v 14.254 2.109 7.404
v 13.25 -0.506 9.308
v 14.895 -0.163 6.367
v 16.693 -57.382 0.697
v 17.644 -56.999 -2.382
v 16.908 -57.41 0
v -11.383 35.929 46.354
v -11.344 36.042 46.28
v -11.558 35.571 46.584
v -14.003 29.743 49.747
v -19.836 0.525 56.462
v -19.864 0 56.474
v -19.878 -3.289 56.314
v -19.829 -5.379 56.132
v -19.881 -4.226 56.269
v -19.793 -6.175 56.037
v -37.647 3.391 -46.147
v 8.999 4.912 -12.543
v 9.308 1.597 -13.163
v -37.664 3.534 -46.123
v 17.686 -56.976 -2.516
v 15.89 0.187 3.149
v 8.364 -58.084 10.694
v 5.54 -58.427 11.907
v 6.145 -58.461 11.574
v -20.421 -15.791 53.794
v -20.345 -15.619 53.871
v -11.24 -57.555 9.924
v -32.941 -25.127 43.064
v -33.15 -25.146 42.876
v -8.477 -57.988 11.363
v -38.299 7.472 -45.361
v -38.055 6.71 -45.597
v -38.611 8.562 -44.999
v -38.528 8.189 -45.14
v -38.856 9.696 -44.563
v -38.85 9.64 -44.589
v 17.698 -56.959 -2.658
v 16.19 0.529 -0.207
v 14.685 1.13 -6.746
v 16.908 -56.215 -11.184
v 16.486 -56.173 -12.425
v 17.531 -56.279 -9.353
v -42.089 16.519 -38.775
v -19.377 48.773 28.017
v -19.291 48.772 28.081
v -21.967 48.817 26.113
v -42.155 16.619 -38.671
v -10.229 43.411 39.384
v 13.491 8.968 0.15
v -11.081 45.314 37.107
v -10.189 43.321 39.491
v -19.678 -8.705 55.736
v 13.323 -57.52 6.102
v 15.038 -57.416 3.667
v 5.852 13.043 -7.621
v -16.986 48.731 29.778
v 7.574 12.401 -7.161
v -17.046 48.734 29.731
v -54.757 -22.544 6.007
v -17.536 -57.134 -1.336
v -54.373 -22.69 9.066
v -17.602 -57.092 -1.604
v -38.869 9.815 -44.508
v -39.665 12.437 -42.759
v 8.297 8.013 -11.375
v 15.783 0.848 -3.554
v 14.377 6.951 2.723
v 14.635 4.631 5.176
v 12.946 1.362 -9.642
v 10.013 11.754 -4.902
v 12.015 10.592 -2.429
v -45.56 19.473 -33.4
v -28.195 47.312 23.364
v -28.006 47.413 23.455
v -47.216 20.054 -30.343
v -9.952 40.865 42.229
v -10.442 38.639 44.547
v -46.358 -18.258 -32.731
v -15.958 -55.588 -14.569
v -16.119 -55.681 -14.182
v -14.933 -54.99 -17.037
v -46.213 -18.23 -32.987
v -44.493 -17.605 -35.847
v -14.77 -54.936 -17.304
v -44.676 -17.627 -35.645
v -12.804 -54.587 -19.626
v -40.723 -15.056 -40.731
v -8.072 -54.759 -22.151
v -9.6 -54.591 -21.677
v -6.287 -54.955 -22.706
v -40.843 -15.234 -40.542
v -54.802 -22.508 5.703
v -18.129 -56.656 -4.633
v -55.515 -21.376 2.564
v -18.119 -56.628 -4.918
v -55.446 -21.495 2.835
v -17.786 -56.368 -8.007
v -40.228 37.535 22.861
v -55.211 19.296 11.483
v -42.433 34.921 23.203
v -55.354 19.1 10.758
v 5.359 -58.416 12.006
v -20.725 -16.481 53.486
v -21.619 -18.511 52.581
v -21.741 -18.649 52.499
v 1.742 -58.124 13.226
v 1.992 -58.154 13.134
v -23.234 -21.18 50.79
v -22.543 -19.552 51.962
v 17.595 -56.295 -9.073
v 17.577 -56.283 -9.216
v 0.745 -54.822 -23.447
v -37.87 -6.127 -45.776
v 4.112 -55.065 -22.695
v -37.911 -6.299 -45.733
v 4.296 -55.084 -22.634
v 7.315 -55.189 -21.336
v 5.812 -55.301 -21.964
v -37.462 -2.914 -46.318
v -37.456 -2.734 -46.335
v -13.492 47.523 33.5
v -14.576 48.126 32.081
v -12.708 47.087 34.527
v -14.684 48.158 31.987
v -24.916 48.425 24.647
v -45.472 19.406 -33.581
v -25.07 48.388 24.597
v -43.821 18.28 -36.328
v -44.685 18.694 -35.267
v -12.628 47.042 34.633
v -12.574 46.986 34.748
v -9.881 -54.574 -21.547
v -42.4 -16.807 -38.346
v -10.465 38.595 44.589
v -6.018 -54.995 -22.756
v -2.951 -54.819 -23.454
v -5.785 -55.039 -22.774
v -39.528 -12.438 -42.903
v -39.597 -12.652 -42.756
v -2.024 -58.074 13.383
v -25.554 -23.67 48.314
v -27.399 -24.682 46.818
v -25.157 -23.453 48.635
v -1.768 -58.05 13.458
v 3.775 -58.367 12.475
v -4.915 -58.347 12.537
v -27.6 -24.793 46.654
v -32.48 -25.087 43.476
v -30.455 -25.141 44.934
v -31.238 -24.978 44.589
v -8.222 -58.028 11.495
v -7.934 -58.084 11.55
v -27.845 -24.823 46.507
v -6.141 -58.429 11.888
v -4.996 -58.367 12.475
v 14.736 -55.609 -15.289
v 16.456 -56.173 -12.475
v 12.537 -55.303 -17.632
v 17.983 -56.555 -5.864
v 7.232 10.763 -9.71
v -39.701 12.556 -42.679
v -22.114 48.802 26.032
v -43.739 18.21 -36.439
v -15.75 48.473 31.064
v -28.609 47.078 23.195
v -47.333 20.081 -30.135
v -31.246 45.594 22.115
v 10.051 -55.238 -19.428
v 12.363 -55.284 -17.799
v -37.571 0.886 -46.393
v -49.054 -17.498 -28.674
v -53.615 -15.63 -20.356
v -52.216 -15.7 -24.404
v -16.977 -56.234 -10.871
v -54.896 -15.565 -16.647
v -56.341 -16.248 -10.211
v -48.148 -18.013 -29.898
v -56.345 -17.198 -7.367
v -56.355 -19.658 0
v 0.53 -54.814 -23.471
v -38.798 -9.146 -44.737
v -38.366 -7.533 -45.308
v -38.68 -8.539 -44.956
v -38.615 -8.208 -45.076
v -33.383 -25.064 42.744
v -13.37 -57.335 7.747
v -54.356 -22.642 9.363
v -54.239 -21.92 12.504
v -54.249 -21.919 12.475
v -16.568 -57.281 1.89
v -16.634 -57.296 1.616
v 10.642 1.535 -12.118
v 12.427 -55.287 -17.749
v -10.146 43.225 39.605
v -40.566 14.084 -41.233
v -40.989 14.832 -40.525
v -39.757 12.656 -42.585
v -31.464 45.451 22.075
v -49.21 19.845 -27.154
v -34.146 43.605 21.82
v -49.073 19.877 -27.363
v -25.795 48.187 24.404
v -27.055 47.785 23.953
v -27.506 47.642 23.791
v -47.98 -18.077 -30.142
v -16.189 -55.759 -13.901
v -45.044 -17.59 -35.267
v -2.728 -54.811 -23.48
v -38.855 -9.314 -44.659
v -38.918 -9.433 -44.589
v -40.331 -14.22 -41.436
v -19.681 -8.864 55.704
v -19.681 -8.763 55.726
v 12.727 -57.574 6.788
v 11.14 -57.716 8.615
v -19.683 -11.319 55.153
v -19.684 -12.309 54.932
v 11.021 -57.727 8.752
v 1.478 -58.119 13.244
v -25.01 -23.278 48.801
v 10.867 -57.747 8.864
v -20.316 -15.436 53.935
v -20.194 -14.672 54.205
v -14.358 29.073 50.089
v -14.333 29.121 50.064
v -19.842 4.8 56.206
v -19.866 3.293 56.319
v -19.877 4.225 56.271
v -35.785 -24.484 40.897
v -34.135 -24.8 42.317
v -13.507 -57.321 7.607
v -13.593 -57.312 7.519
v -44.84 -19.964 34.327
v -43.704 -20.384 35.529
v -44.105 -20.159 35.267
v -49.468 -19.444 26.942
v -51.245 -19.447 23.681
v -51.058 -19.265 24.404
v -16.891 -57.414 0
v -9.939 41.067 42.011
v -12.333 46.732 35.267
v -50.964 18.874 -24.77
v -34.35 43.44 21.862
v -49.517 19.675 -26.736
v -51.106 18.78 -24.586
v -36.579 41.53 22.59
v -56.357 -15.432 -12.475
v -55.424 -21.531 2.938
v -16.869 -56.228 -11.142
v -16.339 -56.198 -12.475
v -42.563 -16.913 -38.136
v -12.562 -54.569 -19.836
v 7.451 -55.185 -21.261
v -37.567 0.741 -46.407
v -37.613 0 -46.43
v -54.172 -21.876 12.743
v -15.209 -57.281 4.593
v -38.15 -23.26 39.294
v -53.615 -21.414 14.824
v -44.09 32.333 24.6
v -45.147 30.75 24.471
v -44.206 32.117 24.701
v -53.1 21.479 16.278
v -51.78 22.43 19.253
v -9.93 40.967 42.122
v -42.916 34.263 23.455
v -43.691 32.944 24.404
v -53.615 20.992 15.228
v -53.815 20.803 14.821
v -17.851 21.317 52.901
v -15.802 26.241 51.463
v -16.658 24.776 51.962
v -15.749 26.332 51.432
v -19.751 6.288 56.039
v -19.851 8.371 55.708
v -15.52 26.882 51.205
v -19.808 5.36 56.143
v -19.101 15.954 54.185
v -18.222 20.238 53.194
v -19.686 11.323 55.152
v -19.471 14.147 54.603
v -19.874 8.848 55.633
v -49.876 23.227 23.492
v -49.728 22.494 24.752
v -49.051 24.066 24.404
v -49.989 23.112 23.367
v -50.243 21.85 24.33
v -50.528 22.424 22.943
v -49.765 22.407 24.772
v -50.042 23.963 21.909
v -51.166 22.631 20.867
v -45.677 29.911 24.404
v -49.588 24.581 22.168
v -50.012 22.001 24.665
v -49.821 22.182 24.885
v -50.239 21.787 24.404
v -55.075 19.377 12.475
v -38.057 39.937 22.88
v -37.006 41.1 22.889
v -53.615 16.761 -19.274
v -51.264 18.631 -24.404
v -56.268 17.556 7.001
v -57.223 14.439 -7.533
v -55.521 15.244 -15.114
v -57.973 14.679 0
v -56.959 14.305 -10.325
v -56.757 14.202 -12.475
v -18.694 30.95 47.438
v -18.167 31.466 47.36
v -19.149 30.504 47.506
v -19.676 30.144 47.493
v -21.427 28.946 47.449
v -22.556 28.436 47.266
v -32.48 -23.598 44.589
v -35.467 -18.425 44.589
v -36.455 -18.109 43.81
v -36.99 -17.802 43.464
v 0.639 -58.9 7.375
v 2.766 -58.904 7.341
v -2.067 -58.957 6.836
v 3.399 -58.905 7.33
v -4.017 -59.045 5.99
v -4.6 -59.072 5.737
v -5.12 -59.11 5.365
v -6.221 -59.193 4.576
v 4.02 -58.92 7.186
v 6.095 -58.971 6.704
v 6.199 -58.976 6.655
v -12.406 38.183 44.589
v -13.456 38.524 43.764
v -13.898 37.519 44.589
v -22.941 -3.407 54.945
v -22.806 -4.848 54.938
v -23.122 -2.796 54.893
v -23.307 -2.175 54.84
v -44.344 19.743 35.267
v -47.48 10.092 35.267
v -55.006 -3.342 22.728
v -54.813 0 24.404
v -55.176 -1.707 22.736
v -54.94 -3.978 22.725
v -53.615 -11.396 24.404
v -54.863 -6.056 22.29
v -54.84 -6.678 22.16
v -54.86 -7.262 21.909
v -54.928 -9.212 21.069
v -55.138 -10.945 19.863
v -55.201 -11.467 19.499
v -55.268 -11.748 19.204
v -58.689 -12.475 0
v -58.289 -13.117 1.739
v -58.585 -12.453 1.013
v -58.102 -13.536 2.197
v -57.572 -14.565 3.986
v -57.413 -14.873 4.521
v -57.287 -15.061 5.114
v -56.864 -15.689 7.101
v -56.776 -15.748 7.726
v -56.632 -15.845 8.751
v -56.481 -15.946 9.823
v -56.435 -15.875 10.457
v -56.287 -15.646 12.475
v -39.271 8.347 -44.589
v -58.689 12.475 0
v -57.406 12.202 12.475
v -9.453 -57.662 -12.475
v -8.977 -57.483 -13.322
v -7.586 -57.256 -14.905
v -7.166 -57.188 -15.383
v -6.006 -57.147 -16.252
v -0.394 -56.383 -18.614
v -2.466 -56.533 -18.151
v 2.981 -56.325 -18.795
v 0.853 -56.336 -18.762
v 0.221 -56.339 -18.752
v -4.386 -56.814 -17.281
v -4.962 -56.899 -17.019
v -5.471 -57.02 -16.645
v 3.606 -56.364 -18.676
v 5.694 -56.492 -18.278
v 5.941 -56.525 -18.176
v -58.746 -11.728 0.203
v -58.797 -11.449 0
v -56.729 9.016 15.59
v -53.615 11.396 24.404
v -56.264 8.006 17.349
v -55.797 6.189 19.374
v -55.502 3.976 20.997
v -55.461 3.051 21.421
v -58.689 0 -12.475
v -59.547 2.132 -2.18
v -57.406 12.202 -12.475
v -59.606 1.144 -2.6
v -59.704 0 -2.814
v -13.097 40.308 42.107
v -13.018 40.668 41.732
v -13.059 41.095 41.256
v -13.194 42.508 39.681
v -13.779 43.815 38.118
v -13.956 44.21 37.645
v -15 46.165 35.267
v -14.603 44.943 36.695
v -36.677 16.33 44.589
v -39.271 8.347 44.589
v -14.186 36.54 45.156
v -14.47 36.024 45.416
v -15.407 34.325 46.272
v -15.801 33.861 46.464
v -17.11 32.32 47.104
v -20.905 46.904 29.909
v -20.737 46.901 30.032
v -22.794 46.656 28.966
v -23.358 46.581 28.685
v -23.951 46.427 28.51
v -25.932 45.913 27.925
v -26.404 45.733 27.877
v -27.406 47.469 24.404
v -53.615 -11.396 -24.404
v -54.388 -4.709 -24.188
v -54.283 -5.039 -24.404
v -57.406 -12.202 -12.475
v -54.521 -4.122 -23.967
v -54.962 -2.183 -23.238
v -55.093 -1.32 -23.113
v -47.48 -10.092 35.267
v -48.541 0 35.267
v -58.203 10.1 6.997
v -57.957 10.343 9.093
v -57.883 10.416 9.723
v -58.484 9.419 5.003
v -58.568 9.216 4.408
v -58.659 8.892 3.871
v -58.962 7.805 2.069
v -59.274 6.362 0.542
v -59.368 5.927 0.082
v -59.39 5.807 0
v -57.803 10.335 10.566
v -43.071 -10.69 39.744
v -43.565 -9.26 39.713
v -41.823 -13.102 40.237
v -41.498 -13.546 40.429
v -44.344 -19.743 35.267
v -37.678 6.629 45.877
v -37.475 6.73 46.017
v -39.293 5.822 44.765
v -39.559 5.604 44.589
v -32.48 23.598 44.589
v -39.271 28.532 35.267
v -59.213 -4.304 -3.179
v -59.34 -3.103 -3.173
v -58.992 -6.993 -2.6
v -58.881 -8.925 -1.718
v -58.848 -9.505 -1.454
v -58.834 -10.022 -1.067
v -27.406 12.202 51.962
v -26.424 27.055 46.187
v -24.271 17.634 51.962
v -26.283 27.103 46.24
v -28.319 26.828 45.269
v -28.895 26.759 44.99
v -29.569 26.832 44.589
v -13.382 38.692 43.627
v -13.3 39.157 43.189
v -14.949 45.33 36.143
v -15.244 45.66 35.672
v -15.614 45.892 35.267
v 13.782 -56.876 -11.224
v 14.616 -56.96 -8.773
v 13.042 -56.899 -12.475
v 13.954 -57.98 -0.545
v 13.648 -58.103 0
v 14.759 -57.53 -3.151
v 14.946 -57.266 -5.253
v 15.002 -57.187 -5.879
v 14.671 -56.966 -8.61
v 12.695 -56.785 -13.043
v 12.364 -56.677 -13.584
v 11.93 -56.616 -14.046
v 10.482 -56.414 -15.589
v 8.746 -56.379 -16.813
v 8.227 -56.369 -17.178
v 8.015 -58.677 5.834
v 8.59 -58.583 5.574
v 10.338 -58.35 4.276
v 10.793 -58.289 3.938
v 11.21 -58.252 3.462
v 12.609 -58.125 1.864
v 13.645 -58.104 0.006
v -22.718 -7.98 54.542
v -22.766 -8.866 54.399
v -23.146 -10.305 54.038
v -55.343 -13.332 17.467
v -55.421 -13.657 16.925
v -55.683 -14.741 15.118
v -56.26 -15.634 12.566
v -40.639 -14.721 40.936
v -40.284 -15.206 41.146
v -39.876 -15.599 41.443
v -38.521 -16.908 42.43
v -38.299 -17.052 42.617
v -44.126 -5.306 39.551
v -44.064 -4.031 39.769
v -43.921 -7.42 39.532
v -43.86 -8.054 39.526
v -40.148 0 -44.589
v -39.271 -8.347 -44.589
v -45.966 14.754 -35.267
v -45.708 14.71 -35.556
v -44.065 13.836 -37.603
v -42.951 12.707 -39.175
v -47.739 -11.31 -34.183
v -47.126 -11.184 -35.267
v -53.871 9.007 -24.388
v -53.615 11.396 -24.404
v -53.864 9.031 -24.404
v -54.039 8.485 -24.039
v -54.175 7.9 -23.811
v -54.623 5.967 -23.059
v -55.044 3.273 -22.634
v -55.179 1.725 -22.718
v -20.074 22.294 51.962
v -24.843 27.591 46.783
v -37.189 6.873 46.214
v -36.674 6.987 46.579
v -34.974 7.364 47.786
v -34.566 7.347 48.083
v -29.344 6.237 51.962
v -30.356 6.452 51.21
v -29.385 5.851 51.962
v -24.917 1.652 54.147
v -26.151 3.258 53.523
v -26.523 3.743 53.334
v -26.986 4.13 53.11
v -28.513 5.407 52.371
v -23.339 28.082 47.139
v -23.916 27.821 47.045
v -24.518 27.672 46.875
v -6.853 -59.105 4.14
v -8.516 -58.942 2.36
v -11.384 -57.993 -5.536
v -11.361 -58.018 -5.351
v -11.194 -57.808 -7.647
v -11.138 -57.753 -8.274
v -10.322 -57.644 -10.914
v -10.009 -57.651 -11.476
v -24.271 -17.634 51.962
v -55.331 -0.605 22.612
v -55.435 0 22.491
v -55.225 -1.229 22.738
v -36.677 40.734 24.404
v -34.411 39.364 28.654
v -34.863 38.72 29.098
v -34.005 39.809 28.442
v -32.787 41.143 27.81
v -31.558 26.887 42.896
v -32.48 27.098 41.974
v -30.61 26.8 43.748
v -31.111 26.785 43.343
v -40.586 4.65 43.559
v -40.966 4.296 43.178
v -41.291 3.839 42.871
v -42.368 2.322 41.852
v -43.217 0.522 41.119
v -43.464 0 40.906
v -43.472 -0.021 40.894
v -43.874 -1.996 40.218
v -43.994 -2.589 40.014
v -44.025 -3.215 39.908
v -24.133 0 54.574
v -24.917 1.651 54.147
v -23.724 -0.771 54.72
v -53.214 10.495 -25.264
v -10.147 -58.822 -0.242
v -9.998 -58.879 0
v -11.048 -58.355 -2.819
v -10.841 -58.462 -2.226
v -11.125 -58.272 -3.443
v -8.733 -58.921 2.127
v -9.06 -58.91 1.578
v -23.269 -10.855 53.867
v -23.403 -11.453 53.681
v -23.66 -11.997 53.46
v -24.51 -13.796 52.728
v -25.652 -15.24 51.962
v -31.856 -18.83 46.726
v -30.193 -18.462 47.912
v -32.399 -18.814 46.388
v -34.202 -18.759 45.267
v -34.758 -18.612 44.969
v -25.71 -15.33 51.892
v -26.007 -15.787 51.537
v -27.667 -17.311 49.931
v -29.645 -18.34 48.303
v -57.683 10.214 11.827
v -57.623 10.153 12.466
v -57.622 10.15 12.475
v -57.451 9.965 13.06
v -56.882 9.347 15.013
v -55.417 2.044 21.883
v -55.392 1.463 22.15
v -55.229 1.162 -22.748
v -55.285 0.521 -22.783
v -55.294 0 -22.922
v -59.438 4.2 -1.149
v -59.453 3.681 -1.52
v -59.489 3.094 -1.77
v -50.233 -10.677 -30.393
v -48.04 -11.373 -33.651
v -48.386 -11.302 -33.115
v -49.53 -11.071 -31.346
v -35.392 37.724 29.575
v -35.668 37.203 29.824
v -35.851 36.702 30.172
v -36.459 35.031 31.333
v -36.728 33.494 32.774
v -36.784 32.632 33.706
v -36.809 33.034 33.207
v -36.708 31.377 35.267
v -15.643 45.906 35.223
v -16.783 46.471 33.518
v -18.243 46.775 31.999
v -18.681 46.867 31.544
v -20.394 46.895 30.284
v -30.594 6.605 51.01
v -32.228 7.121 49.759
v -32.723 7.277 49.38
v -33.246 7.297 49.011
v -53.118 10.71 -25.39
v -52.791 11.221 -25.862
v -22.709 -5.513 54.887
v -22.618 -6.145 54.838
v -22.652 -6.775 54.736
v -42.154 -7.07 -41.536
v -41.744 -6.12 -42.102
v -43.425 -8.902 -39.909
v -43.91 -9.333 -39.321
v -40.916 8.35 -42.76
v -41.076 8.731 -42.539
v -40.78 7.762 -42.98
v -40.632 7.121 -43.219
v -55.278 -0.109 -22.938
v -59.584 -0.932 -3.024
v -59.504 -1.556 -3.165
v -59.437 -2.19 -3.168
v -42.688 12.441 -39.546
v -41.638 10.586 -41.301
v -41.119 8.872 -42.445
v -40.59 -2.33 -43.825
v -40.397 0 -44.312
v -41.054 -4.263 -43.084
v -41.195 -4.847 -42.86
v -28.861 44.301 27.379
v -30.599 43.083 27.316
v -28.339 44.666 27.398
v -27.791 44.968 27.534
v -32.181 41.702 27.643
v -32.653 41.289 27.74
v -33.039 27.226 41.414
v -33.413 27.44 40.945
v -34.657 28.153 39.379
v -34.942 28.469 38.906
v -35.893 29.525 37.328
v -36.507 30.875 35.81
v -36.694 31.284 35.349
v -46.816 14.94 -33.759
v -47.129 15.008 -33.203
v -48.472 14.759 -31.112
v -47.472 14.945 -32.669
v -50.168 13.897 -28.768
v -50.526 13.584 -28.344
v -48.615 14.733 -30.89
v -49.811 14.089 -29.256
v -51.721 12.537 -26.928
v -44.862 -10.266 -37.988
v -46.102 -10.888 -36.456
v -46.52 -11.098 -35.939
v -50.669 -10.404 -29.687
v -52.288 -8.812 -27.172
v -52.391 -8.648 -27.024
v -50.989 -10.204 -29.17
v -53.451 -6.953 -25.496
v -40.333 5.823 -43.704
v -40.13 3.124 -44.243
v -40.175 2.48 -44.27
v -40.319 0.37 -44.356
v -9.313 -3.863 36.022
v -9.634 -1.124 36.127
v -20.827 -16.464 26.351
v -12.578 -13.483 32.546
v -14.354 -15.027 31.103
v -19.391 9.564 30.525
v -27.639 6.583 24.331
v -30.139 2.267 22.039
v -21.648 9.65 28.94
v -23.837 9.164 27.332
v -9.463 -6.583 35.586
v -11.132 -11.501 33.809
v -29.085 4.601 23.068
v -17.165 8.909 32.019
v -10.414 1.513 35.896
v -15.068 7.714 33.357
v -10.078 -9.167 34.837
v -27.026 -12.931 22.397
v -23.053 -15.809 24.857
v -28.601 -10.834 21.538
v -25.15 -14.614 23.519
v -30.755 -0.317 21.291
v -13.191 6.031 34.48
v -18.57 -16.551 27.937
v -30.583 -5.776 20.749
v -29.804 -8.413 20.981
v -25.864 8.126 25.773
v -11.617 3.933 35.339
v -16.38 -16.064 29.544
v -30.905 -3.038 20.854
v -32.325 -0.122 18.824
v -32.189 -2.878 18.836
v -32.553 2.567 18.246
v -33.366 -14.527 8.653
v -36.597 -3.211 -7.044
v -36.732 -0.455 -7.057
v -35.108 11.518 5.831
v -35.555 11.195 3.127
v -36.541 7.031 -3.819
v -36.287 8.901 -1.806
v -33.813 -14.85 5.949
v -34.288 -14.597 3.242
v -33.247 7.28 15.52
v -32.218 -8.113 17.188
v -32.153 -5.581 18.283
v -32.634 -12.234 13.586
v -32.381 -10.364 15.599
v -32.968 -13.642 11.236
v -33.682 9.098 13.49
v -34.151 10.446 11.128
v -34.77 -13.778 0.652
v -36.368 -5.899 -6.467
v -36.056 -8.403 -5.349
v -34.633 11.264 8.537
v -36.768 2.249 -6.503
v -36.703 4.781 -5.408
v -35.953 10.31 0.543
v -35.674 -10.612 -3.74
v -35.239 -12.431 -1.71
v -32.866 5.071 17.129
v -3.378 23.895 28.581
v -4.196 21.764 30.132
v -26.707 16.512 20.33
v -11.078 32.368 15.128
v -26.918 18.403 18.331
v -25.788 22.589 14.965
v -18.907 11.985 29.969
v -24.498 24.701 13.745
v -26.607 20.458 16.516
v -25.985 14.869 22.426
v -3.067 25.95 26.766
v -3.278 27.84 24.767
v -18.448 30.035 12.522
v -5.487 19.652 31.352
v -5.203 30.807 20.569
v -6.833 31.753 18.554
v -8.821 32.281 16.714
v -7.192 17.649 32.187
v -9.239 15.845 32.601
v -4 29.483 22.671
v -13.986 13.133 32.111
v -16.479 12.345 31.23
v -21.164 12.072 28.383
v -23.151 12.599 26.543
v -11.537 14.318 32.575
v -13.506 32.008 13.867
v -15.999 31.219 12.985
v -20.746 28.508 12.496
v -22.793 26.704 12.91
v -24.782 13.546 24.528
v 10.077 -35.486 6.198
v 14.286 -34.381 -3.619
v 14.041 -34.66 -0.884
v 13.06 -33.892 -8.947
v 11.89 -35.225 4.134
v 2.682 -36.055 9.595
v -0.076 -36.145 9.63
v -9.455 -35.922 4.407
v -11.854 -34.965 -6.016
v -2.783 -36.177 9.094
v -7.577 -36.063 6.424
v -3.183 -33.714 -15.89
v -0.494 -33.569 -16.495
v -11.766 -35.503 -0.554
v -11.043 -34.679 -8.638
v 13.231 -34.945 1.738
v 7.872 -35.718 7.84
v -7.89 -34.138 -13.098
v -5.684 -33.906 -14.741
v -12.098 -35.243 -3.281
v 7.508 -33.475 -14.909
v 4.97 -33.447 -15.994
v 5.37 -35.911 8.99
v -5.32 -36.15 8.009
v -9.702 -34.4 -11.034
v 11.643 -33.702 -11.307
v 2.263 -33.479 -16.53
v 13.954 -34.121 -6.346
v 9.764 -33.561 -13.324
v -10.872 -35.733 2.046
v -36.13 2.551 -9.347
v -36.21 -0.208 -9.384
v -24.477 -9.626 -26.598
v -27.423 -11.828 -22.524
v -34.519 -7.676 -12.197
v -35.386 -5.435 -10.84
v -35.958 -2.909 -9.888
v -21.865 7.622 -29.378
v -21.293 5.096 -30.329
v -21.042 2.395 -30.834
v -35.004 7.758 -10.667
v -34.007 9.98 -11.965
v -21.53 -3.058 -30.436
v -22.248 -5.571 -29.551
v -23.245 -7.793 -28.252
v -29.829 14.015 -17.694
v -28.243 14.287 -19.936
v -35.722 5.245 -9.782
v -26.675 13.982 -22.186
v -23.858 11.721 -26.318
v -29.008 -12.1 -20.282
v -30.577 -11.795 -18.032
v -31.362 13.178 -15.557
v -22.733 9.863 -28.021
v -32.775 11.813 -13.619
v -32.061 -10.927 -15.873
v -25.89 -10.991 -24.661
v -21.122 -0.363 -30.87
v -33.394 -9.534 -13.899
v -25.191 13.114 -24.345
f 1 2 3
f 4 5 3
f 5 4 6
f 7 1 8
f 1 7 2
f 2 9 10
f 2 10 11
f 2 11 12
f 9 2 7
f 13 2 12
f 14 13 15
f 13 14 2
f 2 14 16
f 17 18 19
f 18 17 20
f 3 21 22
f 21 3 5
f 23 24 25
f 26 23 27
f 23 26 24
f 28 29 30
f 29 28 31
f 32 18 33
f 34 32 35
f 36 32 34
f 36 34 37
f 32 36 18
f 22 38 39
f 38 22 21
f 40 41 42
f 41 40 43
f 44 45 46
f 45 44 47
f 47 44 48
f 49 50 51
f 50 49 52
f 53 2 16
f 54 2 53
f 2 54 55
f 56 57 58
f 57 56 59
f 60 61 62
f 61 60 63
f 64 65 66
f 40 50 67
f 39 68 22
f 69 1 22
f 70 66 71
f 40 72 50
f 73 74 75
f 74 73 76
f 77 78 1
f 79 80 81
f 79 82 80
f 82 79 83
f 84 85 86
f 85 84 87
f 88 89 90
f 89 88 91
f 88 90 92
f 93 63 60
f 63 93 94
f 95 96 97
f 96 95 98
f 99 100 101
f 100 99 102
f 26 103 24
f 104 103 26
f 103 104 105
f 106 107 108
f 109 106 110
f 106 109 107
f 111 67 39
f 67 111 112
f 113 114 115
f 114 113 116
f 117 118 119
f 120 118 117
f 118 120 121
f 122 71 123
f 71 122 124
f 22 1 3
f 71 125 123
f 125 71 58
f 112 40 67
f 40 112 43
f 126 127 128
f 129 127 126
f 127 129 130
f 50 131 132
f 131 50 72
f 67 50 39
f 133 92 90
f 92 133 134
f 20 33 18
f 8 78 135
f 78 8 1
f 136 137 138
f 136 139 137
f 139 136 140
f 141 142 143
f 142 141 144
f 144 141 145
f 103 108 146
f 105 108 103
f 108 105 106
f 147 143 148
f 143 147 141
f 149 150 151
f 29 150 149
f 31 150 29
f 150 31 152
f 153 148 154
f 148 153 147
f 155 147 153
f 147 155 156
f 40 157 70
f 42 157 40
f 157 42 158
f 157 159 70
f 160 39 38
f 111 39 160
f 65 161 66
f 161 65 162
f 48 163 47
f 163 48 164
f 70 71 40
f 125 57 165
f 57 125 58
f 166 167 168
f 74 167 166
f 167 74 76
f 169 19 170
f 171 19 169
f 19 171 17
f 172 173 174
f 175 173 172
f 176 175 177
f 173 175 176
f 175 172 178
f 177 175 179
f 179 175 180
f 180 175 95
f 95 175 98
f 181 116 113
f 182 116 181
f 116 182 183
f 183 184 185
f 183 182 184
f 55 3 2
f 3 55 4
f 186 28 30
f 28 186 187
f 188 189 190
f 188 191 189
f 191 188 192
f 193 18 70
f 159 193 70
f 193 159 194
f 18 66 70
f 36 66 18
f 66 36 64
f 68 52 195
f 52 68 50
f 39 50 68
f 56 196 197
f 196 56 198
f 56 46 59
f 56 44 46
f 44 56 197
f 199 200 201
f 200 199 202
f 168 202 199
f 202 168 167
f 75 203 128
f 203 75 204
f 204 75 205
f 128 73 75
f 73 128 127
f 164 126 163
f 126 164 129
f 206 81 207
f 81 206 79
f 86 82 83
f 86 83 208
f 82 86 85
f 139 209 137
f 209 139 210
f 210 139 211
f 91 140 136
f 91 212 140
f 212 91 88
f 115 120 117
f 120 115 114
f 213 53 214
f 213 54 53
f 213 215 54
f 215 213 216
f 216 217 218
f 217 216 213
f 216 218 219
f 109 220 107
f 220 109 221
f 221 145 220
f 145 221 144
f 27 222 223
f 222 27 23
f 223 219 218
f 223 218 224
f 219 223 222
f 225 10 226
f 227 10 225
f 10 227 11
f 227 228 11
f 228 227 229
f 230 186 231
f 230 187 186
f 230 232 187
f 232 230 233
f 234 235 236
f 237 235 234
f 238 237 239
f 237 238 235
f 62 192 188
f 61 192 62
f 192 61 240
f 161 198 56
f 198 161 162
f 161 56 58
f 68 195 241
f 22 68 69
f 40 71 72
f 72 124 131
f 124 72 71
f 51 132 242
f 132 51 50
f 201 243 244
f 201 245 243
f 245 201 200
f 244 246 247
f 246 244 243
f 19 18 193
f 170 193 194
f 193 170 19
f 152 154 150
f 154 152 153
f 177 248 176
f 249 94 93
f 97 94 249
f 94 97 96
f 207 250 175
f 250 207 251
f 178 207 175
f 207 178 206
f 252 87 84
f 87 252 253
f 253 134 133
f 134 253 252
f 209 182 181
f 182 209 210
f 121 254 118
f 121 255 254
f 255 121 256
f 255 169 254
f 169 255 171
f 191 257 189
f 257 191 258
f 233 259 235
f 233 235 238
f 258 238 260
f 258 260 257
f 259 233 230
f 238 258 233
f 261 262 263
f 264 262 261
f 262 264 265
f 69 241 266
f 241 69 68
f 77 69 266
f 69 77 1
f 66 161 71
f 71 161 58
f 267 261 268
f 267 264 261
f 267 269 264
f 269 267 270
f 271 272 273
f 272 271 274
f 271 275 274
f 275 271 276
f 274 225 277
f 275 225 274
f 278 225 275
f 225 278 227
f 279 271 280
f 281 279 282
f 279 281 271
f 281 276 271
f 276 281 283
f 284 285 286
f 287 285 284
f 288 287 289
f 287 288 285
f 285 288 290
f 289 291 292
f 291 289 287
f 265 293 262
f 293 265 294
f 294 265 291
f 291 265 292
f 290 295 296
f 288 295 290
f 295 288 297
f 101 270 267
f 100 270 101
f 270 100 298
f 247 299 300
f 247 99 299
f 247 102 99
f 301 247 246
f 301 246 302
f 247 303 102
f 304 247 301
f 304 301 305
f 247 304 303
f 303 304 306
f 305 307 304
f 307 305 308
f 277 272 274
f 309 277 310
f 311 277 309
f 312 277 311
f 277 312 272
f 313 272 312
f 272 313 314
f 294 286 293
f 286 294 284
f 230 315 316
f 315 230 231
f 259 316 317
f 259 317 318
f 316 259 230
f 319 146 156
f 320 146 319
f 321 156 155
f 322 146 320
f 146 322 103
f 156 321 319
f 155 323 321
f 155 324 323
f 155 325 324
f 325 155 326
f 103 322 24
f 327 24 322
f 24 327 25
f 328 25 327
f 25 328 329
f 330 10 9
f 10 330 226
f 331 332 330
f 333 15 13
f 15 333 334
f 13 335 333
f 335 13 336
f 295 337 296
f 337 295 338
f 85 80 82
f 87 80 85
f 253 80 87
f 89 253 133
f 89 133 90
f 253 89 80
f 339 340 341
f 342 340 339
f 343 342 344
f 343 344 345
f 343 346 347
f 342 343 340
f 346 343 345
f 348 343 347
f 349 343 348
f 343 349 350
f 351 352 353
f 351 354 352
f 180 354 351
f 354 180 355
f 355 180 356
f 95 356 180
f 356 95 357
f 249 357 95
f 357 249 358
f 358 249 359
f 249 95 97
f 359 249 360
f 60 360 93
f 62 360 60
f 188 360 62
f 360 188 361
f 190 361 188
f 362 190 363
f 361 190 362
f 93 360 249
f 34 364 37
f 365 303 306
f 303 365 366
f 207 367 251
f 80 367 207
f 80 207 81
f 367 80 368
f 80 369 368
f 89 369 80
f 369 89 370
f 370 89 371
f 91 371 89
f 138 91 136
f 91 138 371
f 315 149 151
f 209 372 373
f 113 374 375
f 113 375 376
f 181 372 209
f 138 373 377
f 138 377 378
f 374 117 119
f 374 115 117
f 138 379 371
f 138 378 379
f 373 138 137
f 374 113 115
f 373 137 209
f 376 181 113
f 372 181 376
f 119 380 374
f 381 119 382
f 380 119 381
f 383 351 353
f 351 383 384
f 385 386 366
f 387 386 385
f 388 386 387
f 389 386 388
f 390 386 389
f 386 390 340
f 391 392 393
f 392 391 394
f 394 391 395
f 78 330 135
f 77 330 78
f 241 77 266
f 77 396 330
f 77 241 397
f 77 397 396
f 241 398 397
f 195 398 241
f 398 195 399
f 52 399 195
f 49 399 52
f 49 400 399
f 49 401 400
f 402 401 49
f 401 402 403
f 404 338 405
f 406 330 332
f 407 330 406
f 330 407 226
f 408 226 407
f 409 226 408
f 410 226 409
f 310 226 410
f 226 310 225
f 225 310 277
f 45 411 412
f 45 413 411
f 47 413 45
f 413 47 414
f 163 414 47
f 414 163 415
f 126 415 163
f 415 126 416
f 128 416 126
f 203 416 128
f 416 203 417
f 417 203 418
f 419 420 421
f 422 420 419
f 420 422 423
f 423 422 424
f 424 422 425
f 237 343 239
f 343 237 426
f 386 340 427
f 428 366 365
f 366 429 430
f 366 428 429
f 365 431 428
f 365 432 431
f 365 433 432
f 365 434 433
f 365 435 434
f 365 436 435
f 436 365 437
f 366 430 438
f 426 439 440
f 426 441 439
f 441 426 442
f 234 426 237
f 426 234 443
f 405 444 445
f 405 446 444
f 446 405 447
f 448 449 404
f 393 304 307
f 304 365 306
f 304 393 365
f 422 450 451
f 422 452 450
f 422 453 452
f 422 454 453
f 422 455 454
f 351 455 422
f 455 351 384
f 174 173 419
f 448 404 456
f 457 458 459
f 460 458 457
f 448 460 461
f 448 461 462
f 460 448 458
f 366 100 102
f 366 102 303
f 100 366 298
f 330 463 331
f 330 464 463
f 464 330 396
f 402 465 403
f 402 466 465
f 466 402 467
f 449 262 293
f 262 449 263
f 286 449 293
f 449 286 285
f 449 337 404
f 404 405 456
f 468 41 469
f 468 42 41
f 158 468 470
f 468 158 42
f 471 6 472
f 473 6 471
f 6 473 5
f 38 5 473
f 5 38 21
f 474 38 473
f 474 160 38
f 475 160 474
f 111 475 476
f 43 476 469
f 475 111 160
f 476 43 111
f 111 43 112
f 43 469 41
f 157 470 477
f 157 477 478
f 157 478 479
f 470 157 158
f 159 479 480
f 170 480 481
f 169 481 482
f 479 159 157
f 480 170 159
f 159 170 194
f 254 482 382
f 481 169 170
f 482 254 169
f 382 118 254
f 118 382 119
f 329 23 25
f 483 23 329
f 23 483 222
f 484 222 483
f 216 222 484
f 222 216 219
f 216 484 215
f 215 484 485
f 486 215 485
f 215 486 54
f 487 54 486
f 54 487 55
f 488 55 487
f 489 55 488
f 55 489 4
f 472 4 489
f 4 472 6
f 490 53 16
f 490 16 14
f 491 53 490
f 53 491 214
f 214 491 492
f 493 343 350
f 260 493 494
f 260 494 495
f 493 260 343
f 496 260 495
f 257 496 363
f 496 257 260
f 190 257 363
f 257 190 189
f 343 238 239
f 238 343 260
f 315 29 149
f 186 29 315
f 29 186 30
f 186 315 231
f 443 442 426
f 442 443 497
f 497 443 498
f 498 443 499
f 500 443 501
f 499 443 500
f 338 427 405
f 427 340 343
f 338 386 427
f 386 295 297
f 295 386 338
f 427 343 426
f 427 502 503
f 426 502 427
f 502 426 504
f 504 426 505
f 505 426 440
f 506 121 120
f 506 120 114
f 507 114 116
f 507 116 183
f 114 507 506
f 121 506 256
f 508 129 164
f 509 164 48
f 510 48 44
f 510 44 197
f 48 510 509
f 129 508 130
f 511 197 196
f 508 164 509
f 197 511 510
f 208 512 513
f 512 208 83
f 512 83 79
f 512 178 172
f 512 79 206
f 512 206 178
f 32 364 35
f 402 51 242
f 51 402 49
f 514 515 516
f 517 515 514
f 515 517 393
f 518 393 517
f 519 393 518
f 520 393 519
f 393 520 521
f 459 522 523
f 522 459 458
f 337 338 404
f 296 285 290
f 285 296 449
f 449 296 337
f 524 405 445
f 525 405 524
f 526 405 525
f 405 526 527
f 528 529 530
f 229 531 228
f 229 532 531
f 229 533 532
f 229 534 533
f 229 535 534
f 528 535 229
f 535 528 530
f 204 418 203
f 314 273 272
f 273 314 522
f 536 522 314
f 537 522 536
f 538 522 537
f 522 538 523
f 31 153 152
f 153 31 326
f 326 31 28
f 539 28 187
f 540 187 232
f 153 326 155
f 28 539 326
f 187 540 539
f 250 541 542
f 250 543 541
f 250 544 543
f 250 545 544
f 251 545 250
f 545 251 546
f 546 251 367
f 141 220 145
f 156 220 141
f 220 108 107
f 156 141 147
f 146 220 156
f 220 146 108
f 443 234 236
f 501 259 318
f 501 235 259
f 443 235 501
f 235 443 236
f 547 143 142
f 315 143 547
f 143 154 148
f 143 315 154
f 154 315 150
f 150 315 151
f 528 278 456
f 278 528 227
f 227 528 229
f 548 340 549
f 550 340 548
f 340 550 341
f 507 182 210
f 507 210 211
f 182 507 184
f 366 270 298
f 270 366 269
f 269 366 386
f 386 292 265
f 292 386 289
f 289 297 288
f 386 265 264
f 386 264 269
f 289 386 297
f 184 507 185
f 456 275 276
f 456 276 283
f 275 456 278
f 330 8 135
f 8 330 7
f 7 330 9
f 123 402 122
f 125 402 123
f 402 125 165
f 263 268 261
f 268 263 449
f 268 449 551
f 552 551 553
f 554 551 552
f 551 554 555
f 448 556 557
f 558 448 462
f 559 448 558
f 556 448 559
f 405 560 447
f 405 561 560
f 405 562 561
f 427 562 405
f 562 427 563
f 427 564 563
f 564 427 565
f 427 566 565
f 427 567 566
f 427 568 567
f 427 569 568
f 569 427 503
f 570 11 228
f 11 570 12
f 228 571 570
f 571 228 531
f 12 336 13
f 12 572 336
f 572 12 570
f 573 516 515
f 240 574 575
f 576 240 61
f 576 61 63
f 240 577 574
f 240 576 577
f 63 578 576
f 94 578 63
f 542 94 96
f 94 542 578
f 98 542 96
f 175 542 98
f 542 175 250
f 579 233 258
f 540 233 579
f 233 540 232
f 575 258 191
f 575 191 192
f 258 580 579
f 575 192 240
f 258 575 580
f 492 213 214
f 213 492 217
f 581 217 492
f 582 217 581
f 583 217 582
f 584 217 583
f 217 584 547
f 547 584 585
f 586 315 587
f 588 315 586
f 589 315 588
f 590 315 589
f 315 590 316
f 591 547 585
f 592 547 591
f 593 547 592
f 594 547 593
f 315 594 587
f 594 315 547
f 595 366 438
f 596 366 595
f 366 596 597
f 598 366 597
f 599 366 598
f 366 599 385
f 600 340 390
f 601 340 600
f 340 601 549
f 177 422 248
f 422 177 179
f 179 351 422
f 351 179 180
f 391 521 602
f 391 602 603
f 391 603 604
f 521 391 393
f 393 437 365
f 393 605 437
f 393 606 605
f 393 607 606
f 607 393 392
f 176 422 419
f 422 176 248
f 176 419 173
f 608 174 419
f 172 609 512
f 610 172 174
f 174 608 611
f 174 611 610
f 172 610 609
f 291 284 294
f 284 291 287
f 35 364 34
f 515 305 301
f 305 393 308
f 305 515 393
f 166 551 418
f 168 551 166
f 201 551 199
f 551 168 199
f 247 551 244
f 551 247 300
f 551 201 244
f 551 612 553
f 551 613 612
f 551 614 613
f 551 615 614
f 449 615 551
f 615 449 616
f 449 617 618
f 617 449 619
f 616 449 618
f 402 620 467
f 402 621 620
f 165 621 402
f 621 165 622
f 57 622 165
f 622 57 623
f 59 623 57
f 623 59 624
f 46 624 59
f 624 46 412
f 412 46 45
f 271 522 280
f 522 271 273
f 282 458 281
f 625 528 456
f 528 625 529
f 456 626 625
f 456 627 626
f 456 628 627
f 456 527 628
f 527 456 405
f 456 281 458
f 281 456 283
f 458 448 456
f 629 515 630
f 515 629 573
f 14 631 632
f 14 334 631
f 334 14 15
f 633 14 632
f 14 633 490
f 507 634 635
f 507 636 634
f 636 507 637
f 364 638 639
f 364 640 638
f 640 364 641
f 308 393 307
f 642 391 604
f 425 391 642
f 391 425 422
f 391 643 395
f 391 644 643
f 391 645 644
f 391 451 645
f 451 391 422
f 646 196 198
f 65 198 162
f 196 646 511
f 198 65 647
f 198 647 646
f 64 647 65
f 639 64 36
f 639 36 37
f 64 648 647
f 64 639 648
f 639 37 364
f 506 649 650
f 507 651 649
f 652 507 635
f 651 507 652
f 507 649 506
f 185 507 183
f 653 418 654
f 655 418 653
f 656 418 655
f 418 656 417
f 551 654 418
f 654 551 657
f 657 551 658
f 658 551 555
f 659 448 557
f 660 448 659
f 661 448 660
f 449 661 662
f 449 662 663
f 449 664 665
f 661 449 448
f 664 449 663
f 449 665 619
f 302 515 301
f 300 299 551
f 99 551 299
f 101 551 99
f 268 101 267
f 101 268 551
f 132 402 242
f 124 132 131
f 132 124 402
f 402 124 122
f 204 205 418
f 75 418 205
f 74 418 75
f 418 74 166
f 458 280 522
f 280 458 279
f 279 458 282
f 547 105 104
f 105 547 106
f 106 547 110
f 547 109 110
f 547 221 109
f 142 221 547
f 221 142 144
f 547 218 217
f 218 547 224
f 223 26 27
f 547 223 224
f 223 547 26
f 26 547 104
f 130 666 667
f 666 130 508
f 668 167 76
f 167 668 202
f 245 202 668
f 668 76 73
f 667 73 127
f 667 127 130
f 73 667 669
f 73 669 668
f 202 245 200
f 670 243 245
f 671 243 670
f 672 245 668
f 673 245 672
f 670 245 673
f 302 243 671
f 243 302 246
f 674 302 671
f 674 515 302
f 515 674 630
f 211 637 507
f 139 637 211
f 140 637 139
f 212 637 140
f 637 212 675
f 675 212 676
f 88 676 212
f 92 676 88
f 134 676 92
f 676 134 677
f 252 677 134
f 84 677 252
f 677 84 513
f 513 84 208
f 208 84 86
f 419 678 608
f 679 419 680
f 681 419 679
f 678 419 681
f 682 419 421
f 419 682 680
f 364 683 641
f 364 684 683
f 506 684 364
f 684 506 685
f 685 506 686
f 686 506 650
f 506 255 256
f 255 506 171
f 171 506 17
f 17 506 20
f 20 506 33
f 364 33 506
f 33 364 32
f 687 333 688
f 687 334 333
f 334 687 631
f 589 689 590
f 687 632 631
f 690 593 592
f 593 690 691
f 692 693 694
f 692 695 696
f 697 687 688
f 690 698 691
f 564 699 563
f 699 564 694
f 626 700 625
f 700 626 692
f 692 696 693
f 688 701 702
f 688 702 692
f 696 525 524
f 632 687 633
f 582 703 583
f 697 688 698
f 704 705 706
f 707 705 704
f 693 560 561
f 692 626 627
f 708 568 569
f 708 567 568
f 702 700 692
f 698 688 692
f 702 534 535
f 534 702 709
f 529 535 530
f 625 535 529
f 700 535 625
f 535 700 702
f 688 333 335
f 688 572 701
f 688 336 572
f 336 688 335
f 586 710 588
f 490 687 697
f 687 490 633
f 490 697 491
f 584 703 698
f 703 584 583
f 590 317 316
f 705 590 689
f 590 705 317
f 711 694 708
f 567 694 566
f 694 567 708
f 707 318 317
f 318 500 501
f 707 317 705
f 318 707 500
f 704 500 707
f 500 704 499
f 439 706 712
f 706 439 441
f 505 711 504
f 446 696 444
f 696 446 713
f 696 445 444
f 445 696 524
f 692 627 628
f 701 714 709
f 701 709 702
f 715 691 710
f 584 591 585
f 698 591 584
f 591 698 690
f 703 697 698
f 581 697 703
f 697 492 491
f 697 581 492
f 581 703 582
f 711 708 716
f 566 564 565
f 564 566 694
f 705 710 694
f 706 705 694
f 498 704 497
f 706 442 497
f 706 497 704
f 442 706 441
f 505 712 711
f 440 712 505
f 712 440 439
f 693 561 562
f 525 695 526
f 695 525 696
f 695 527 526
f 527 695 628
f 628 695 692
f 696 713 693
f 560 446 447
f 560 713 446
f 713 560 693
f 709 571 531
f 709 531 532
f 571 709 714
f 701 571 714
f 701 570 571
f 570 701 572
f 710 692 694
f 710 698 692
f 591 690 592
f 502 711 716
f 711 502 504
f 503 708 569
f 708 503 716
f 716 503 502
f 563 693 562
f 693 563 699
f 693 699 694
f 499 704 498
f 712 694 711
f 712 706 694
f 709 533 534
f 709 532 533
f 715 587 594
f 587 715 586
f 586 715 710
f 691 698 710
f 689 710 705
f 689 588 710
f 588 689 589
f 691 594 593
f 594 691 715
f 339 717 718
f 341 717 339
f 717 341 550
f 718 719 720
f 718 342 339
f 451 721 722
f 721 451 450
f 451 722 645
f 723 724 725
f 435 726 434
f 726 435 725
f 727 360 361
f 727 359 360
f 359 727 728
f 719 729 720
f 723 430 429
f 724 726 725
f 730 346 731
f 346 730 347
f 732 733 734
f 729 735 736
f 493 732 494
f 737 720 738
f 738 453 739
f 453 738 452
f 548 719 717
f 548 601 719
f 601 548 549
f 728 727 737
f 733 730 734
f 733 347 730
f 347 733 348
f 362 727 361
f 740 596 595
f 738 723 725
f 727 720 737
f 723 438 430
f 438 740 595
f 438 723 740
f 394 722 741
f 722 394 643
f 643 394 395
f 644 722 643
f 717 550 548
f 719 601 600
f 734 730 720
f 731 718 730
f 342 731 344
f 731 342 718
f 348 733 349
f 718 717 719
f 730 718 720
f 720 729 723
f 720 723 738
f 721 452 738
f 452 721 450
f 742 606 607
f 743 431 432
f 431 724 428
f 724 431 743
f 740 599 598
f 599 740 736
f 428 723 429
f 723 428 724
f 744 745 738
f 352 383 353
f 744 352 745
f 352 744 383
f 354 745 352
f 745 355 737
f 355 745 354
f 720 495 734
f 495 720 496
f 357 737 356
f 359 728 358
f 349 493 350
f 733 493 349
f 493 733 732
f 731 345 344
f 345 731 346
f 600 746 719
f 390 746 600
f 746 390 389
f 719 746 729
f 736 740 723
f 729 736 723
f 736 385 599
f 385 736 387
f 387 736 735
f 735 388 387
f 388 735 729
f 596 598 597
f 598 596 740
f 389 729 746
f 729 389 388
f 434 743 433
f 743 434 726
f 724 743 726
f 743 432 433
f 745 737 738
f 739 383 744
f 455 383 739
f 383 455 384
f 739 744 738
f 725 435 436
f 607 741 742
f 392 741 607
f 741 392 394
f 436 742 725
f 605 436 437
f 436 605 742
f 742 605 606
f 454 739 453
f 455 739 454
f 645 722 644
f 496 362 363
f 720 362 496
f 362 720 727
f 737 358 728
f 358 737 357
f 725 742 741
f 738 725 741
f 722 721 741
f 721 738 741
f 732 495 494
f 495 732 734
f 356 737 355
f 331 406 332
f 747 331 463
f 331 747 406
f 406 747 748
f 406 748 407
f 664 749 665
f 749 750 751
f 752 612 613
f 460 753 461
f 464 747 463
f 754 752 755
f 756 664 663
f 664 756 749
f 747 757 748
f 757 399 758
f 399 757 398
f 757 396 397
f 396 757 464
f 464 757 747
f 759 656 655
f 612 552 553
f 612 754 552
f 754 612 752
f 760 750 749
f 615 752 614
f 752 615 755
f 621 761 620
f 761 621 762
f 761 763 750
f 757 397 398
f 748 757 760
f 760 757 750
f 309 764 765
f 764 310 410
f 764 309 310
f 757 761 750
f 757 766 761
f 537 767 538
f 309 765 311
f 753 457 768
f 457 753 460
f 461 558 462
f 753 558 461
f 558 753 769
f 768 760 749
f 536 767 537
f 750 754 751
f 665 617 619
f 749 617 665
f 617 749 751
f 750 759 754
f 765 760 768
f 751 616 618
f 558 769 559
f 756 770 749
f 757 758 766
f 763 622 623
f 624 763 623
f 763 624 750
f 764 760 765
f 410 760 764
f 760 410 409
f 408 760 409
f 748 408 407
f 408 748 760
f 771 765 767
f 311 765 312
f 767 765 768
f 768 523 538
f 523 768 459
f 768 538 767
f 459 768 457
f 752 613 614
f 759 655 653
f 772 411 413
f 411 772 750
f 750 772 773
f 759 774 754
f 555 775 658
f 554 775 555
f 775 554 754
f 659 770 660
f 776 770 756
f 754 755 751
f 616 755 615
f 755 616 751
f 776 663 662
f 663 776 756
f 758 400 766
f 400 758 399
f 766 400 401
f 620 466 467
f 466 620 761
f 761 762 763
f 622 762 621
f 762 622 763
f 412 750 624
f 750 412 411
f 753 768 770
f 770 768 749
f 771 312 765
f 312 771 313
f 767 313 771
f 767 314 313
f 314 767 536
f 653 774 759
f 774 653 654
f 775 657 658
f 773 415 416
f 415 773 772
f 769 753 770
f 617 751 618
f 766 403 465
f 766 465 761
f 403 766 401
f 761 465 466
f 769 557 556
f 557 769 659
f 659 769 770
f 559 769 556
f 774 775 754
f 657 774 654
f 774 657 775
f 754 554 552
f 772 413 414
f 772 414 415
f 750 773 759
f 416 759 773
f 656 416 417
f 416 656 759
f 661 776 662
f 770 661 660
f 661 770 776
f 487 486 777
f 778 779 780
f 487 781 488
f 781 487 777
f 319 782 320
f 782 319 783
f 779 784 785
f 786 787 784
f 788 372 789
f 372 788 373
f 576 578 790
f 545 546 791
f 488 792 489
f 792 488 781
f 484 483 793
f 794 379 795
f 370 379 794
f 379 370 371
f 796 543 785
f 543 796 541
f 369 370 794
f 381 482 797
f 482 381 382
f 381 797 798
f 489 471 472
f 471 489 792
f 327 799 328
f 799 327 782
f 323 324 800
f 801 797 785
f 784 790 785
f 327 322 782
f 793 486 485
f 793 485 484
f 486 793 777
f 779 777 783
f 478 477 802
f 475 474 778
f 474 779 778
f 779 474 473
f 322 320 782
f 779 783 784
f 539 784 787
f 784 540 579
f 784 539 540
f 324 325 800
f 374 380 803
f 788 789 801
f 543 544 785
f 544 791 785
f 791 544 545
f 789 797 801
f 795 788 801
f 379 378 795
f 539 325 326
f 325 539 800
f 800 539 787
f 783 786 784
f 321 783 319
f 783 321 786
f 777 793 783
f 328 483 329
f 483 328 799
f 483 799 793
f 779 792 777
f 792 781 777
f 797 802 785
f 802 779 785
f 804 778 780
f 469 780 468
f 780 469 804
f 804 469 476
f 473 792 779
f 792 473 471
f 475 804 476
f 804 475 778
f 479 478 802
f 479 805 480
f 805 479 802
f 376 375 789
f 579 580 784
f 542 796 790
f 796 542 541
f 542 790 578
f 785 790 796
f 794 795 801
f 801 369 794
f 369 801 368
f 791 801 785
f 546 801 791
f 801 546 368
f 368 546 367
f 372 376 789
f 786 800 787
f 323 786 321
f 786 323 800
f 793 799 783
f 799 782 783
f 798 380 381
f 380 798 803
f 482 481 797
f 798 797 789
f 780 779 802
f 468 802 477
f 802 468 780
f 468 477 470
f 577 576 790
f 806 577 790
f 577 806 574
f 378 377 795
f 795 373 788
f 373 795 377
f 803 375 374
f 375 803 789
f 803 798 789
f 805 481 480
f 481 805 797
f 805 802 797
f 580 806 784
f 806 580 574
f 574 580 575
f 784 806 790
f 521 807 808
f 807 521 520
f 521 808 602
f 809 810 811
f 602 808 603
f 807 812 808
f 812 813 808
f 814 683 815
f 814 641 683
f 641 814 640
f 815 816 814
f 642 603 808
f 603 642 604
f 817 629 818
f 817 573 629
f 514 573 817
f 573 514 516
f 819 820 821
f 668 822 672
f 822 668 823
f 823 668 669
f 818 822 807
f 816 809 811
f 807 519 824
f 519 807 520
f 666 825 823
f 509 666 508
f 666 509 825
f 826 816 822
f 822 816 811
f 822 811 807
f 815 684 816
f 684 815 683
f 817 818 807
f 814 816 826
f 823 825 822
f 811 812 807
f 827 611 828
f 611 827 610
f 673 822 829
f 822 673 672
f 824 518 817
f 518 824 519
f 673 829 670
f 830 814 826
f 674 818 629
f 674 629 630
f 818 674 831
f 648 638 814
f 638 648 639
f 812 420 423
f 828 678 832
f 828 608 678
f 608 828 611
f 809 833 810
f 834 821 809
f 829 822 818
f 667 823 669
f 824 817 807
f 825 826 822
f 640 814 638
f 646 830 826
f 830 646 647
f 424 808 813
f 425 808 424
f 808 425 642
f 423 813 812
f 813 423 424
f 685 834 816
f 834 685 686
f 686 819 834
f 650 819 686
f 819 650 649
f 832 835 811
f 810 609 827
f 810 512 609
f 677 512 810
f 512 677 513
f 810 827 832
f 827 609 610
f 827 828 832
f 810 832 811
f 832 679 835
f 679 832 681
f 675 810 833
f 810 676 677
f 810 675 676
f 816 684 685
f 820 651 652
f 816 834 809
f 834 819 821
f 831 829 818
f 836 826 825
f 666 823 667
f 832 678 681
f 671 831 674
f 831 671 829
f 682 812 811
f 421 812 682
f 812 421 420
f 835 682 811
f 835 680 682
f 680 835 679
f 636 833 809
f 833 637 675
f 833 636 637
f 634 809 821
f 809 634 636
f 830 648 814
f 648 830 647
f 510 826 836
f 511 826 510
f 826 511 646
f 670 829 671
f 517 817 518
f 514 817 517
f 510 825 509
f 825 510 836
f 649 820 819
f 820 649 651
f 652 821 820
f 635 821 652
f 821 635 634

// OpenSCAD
angle=0;
rotate(a=angle,v=[0,0,1]) {
union() {
	difference() {
		intersection() {
			hull() {
				rotate(a = -35.6571298247, v = [-0.0985751959, 0.5745383453, 0.0000000000]) {
					rotate(a = -0.0000000000, v = [0.0000000000, 0.0000000000, 0.0000000000]) {
						cylinder(h = 60, r = 16.2000000000);
					}
				}
				rotate(a = -35.6571298247, v = [-0.0985751959, 0.5745383453, 0.0000000000]) {
					rotate(a = -45.0000000000, v = [0.0000000000, 0.7071067812, 0.0000000000]) {
						cylinder(h = 60, r = 16.2000000000);
					}
				}
				rotate(a = -35.6571298247, v = [-0.0985751959, 0.5745383453, 0.0000000000]) {
					rotate(a = -45.0000000000, v = [0.7071067812, 0.0000000000, -0.0000000000]) {
						cylinder(h = 60, r = 16.2000000000);
					}
				}
				rotate(a = -35.6571298247, v = [-0.0985751959, 0.5745383453, 0.0000000000]) {
					rotate(a = -90.0000000000, v = [-1.0000000000, 0.0000000000, 0.0000000000]) {
						cylinder(h = 60, r = 16.2000000000);
					}
				}
				rotate(a = -35.6571298247, v = [-0.0985751959, 0.5745383453, 0.0000000000]) {
					rotate(a = -90.0000000000, v = [0.0000000000, 1.0000000000, 0.0000000000]) {
						cylinder(h = 60, r = 16.2000000000);
					}
				}
			}
			sphere(r = 60);
		}
		union() {
			rotate(a = -35.6571298247, v = [-0.0985751959, 0.5745383453, 0.0000000000]) {
				rotate(a = -0.0000000000, v = [0.0000000000, 0.0000000000, 0.0000000000]) {
					translate(v = [0, 0, 35]) {
						cylinder(h = 100, r = 13.2000000000);
					}
				}
			}
			rotate(a = -35.6571298247, v = [-0.0985751959, 0.5745383453, 0.0000000000]) {
				rotate(a = -45.0000000000, v = [0.0000000000, 0.7071067812, 0.0000000000]) {
					translate(v = [0, 0, 35]) {
						cylinder(h = 100, r = 13.2000000000);
					}
				}
			}
			rotate(a = -35.6571298247, v = [-0.0985751959, 0.5745383453, 0.0000000000]) {
				rotate(a = -45.0000000000, v = [0.7071067812, 0.0000000000, -0.0000000000]) {
					translate(v = [0, 0, 35]) {
						cylinder(h = 100, r = 13.2000000000);
					}
				}
			}
			rotate(a = -35.6571298247, v = [-0.0985751959, 0.5745383453, 0.0000000000]) {
				rotate(a = -90.0000000000, v = [-1.0000000000, 0.0000000000, 0.0000000000]) {
					translate(v = [0, 0, 35]) {
						cylinder(h = 100, r = 13.2000000000);
					}
				}
			}
			rotate(a = -35.6571298247, v = [-0.0985751959, 0.5745383453, 0.0000000000]) {
				rotate(a = -90.0000000000, v = [0.0000000000, 1.0000000000, 0.0000000000]) {
					translate(v = [0, 0, 35]) {
						cylinder(h = 100, r = 13.2000000000);
					}
				}
			}
		}
	}
}}
